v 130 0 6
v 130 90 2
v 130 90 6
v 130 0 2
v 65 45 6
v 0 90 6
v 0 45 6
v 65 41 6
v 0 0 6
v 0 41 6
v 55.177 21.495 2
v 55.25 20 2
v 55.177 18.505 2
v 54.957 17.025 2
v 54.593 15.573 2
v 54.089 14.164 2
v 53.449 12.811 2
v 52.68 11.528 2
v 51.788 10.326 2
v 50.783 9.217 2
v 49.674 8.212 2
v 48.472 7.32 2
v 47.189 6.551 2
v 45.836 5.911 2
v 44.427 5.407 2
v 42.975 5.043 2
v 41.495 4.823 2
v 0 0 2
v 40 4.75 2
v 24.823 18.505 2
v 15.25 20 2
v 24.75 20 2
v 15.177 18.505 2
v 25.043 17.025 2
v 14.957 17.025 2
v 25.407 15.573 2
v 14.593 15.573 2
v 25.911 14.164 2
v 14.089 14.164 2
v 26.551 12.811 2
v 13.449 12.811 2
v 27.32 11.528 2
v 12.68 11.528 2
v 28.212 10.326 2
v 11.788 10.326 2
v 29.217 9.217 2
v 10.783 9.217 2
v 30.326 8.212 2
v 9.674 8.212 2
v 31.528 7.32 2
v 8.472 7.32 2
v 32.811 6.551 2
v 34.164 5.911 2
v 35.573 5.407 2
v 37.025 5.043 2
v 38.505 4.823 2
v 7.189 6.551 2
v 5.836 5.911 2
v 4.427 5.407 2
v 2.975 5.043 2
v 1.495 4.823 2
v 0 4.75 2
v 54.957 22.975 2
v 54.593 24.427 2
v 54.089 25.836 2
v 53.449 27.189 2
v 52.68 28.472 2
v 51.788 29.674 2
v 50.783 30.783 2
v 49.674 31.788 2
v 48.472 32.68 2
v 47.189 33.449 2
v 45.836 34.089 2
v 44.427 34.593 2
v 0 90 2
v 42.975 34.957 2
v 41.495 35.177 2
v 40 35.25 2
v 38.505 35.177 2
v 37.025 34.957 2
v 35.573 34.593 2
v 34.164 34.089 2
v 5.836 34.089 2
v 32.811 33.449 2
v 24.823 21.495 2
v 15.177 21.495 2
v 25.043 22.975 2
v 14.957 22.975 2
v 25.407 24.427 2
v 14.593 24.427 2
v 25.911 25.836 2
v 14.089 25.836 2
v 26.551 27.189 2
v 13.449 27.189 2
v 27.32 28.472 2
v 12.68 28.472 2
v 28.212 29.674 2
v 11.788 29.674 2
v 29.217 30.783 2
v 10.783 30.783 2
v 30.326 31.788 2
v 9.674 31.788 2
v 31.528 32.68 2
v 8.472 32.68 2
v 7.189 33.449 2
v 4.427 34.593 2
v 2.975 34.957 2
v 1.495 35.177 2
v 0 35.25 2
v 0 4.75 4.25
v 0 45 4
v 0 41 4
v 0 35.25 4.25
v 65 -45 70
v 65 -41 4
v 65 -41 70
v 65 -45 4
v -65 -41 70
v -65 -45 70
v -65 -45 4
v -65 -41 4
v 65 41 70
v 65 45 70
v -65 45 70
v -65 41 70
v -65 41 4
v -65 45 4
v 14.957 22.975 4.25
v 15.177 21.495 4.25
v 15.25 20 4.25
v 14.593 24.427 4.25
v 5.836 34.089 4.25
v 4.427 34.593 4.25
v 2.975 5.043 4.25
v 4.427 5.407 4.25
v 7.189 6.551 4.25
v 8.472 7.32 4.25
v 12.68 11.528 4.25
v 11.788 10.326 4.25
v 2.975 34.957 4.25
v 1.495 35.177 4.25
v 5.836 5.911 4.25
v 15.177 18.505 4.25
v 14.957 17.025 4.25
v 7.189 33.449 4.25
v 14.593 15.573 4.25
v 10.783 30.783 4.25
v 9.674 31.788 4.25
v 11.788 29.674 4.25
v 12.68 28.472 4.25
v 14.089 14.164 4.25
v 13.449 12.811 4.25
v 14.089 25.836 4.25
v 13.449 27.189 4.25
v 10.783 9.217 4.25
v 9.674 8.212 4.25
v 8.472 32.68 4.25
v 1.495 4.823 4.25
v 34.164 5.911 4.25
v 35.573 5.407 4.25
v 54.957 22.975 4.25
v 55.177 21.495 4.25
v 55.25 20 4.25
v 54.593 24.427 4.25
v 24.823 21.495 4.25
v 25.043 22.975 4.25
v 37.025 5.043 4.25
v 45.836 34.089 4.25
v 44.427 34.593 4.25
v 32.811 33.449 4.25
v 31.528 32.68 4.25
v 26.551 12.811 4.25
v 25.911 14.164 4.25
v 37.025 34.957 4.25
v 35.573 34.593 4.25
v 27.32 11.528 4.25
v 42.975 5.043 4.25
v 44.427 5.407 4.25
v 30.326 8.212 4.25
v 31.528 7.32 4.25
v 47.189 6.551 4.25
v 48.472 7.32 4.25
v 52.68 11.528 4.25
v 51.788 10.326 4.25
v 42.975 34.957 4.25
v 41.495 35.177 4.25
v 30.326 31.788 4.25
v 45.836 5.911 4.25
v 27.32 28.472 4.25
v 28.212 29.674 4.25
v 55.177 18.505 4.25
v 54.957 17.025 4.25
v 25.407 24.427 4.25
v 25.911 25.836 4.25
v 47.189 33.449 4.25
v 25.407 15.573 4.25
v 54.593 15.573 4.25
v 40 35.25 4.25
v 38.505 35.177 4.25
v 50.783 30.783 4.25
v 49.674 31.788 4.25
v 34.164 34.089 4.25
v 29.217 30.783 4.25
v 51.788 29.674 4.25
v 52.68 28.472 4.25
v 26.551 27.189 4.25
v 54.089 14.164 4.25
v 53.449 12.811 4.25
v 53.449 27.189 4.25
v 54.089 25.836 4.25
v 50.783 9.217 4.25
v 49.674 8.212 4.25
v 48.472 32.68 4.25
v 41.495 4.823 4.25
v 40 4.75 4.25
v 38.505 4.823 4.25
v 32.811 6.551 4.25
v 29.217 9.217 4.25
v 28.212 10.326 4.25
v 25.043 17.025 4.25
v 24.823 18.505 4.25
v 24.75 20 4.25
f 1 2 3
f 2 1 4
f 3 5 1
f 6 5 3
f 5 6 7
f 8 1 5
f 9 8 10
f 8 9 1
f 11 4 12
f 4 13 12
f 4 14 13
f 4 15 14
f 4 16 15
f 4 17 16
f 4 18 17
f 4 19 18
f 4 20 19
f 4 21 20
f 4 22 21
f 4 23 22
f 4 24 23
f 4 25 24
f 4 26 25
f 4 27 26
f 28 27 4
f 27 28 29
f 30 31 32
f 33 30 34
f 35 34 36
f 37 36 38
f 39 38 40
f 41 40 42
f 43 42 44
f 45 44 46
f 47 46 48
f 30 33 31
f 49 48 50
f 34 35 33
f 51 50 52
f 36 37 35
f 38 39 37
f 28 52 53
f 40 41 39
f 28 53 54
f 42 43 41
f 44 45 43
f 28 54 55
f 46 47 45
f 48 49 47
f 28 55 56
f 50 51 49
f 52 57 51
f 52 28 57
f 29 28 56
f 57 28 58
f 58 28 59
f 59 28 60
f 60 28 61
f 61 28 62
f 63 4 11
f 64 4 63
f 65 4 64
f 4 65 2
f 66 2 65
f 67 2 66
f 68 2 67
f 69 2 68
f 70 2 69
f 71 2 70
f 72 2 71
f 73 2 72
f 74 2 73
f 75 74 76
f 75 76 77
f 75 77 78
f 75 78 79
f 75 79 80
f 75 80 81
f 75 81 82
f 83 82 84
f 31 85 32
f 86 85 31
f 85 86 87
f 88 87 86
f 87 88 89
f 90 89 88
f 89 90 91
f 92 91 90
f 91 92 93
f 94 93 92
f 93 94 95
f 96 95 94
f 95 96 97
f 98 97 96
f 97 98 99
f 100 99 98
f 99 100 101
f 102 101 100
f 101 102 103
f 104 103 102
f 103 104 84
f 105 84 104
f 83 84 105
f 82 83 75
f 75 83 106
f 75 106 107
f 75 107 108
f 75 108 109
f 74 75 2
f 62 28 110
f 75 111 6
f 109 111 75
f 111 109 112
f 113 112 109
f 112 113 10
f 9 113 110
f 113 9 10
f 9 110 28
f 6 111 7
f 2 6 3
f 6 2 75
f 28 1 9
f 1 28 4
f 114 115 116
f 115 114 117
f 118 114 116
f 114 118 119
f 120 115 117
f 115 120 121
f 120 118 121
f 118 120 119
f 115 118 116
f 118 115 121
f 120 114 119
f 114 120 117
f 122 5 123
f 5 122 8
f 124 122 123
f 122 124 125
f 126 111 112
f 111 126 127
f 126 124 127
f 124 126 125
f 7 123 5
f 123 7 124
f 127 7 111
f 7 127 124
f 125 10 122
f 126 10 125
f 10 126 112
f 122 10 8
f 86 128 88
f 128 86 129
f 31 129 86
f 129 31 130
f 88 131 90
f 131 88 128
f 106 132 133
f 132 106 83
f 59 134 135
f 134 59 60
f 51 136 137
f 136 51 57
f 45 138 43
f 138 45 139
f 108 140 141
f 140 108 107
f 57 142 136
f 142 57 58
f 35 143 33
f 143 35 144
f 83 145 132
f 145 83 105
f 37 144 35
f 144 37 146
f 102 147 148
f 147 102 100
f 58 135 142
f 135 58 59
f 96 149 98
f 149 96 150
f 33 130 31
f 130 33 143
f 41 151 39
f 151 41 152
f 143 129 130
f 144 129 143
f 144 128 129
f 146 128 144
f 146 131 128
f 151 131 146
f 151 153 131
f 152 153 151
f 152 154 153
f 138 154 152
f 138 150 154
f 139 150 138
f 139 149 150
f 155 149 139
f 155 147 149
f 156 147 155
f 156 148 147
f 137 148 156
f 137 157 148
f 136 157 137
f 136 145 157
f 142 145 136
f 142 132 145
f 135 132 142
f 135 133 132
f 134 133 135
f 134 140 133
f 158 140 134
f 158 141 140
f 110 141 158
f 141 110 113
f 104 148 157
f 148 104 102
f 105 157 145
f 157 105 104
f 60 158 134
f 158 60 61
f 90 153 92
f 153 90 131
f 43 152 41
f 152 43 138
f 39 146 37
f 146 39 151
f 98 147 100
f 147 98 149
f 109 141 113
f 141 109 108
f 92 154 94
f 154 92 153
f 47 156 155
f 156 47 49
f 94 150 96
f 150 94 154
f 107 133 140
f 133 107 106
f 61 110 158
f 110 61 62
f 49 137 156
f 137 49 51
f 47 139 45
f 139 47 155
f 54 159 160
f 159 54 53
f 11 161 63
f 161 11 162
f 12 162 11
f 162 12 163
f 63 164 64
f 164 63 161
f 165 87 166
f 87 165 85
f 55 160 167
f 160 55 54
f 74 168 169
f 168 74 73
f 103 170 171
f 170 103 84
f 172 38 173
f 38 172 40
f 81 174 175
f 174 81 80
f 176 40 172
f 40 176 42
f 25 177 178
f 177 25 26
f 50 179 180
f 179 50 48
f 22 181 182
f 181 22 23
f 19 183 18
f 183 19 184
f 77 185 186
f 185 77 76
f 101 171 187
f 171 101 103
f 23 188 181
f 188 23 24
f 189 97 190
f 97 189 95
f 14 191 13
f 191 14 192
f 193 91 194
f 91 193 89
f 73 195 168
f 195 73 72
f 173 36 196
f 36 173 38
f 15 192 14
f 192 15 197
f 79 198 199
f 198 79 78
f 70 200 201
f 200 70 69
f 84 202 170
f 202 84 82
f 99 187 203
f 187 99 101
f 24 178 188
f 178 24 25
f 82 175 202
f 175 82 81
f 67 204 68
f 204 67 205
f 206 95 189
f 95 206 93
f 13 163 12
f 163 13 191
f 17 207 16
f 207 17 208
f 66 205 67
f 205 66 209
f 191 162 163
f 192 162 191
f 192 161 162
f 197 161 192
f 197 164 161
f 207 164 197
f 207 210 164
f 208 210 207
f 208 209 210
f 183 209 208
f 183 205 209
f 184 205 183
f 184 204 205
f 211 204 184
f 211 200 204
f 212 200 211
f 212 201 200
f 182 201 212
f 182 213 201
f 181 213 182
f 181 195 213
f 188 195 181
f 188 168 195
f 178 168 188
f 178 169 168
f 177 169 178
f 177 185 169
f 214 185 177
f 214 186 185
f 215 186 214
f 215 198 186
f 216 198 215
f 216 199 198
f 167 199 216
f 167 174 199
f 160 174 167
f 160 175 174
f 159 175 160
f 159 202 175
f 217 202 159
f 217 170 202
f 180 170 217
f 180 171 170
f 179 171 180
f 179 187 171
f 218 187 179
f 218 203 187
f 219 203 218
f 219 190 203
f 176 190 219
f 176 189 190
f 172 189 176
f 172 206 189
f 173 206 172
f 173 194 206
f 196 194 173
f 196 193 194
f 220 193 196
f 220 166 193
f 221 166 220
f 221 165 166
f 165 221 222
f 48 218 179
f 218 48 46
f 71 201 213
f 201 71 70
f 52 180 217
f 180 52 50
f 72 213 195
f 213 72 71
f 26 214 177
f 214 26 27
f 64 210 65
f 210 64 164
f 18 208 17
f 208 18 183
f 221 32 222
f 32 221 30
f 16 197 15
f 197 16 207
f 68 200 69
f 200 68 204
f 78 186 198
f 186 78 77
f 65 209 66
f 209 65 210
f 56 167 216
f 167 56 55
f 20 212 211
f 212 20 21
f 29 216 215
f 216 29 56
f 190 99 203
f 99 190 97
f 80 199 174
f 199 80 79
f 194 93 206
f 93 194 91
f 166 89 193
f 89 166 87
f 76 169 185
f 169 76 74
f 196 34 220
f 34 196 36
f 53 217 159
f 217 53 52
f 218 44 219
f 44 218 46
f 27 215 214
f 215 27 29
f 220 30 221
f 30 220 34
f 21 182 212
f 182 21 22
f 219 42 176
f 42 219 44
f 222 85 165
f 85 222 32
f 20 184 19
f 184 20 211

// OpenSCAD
// Dimensions
plate_x = 130;      // Length of plate and walls (X)
plate_y = 90;       // Width of plate (Y)
plate_z = 4;        // Thickness of plate (Z)
hole_dia = 30.5;    // Diameter of tube holes
hole_r = hole_dia / 2;
spacing_x = 40;     // Centre-to-centre spacing in X
spacing_y = 40;     // Centre-to-centre spacing in Y
wall_x = 130;       // Length of walls (X)
wall_y = 4;         // Thickness of walls (Y)
wall_top_z = 70;    // Height of walls from bed (Z)

// Hole centers
x_centers = [ -spacing_x, 0, spacing_x ];
y_centers = [ -spacing_y/2, spacing_y/2 ];

// Module for the solid body
module rack_body() {
    // Plate on bed (z=0 to 4)
    translate([0, 0, plate_z/2]) cube([plate_x, plate_y, plate_z], center=false);
    
    // Walls along long edges (Y = +/- 45)
    // Wall 1: Y from -45 to -41
    translate([-wall_x/2, -plate_y/2, plate_z]) cube([wall_x, wall_y, wall_top_z - plate_z], center=false);
    // Wall 2: Y from 41 to 45
    translate([-wall_x/2, plate_y/2 - wall_y, plate_z]) cube([wall_x, wall_y, wall_top_z - plate_z], center=false);
}

// Build the rack with holes
$fn = 64;
difference() {
    rack_body();
    for (x = x_centers) {
        for (y = y_centers) {
            // Extend holes slightly past plate faces
            translate([x, y, -0.25]) cylinder(r=hole_r, h=4.5, center=false);
        }
    }
}
